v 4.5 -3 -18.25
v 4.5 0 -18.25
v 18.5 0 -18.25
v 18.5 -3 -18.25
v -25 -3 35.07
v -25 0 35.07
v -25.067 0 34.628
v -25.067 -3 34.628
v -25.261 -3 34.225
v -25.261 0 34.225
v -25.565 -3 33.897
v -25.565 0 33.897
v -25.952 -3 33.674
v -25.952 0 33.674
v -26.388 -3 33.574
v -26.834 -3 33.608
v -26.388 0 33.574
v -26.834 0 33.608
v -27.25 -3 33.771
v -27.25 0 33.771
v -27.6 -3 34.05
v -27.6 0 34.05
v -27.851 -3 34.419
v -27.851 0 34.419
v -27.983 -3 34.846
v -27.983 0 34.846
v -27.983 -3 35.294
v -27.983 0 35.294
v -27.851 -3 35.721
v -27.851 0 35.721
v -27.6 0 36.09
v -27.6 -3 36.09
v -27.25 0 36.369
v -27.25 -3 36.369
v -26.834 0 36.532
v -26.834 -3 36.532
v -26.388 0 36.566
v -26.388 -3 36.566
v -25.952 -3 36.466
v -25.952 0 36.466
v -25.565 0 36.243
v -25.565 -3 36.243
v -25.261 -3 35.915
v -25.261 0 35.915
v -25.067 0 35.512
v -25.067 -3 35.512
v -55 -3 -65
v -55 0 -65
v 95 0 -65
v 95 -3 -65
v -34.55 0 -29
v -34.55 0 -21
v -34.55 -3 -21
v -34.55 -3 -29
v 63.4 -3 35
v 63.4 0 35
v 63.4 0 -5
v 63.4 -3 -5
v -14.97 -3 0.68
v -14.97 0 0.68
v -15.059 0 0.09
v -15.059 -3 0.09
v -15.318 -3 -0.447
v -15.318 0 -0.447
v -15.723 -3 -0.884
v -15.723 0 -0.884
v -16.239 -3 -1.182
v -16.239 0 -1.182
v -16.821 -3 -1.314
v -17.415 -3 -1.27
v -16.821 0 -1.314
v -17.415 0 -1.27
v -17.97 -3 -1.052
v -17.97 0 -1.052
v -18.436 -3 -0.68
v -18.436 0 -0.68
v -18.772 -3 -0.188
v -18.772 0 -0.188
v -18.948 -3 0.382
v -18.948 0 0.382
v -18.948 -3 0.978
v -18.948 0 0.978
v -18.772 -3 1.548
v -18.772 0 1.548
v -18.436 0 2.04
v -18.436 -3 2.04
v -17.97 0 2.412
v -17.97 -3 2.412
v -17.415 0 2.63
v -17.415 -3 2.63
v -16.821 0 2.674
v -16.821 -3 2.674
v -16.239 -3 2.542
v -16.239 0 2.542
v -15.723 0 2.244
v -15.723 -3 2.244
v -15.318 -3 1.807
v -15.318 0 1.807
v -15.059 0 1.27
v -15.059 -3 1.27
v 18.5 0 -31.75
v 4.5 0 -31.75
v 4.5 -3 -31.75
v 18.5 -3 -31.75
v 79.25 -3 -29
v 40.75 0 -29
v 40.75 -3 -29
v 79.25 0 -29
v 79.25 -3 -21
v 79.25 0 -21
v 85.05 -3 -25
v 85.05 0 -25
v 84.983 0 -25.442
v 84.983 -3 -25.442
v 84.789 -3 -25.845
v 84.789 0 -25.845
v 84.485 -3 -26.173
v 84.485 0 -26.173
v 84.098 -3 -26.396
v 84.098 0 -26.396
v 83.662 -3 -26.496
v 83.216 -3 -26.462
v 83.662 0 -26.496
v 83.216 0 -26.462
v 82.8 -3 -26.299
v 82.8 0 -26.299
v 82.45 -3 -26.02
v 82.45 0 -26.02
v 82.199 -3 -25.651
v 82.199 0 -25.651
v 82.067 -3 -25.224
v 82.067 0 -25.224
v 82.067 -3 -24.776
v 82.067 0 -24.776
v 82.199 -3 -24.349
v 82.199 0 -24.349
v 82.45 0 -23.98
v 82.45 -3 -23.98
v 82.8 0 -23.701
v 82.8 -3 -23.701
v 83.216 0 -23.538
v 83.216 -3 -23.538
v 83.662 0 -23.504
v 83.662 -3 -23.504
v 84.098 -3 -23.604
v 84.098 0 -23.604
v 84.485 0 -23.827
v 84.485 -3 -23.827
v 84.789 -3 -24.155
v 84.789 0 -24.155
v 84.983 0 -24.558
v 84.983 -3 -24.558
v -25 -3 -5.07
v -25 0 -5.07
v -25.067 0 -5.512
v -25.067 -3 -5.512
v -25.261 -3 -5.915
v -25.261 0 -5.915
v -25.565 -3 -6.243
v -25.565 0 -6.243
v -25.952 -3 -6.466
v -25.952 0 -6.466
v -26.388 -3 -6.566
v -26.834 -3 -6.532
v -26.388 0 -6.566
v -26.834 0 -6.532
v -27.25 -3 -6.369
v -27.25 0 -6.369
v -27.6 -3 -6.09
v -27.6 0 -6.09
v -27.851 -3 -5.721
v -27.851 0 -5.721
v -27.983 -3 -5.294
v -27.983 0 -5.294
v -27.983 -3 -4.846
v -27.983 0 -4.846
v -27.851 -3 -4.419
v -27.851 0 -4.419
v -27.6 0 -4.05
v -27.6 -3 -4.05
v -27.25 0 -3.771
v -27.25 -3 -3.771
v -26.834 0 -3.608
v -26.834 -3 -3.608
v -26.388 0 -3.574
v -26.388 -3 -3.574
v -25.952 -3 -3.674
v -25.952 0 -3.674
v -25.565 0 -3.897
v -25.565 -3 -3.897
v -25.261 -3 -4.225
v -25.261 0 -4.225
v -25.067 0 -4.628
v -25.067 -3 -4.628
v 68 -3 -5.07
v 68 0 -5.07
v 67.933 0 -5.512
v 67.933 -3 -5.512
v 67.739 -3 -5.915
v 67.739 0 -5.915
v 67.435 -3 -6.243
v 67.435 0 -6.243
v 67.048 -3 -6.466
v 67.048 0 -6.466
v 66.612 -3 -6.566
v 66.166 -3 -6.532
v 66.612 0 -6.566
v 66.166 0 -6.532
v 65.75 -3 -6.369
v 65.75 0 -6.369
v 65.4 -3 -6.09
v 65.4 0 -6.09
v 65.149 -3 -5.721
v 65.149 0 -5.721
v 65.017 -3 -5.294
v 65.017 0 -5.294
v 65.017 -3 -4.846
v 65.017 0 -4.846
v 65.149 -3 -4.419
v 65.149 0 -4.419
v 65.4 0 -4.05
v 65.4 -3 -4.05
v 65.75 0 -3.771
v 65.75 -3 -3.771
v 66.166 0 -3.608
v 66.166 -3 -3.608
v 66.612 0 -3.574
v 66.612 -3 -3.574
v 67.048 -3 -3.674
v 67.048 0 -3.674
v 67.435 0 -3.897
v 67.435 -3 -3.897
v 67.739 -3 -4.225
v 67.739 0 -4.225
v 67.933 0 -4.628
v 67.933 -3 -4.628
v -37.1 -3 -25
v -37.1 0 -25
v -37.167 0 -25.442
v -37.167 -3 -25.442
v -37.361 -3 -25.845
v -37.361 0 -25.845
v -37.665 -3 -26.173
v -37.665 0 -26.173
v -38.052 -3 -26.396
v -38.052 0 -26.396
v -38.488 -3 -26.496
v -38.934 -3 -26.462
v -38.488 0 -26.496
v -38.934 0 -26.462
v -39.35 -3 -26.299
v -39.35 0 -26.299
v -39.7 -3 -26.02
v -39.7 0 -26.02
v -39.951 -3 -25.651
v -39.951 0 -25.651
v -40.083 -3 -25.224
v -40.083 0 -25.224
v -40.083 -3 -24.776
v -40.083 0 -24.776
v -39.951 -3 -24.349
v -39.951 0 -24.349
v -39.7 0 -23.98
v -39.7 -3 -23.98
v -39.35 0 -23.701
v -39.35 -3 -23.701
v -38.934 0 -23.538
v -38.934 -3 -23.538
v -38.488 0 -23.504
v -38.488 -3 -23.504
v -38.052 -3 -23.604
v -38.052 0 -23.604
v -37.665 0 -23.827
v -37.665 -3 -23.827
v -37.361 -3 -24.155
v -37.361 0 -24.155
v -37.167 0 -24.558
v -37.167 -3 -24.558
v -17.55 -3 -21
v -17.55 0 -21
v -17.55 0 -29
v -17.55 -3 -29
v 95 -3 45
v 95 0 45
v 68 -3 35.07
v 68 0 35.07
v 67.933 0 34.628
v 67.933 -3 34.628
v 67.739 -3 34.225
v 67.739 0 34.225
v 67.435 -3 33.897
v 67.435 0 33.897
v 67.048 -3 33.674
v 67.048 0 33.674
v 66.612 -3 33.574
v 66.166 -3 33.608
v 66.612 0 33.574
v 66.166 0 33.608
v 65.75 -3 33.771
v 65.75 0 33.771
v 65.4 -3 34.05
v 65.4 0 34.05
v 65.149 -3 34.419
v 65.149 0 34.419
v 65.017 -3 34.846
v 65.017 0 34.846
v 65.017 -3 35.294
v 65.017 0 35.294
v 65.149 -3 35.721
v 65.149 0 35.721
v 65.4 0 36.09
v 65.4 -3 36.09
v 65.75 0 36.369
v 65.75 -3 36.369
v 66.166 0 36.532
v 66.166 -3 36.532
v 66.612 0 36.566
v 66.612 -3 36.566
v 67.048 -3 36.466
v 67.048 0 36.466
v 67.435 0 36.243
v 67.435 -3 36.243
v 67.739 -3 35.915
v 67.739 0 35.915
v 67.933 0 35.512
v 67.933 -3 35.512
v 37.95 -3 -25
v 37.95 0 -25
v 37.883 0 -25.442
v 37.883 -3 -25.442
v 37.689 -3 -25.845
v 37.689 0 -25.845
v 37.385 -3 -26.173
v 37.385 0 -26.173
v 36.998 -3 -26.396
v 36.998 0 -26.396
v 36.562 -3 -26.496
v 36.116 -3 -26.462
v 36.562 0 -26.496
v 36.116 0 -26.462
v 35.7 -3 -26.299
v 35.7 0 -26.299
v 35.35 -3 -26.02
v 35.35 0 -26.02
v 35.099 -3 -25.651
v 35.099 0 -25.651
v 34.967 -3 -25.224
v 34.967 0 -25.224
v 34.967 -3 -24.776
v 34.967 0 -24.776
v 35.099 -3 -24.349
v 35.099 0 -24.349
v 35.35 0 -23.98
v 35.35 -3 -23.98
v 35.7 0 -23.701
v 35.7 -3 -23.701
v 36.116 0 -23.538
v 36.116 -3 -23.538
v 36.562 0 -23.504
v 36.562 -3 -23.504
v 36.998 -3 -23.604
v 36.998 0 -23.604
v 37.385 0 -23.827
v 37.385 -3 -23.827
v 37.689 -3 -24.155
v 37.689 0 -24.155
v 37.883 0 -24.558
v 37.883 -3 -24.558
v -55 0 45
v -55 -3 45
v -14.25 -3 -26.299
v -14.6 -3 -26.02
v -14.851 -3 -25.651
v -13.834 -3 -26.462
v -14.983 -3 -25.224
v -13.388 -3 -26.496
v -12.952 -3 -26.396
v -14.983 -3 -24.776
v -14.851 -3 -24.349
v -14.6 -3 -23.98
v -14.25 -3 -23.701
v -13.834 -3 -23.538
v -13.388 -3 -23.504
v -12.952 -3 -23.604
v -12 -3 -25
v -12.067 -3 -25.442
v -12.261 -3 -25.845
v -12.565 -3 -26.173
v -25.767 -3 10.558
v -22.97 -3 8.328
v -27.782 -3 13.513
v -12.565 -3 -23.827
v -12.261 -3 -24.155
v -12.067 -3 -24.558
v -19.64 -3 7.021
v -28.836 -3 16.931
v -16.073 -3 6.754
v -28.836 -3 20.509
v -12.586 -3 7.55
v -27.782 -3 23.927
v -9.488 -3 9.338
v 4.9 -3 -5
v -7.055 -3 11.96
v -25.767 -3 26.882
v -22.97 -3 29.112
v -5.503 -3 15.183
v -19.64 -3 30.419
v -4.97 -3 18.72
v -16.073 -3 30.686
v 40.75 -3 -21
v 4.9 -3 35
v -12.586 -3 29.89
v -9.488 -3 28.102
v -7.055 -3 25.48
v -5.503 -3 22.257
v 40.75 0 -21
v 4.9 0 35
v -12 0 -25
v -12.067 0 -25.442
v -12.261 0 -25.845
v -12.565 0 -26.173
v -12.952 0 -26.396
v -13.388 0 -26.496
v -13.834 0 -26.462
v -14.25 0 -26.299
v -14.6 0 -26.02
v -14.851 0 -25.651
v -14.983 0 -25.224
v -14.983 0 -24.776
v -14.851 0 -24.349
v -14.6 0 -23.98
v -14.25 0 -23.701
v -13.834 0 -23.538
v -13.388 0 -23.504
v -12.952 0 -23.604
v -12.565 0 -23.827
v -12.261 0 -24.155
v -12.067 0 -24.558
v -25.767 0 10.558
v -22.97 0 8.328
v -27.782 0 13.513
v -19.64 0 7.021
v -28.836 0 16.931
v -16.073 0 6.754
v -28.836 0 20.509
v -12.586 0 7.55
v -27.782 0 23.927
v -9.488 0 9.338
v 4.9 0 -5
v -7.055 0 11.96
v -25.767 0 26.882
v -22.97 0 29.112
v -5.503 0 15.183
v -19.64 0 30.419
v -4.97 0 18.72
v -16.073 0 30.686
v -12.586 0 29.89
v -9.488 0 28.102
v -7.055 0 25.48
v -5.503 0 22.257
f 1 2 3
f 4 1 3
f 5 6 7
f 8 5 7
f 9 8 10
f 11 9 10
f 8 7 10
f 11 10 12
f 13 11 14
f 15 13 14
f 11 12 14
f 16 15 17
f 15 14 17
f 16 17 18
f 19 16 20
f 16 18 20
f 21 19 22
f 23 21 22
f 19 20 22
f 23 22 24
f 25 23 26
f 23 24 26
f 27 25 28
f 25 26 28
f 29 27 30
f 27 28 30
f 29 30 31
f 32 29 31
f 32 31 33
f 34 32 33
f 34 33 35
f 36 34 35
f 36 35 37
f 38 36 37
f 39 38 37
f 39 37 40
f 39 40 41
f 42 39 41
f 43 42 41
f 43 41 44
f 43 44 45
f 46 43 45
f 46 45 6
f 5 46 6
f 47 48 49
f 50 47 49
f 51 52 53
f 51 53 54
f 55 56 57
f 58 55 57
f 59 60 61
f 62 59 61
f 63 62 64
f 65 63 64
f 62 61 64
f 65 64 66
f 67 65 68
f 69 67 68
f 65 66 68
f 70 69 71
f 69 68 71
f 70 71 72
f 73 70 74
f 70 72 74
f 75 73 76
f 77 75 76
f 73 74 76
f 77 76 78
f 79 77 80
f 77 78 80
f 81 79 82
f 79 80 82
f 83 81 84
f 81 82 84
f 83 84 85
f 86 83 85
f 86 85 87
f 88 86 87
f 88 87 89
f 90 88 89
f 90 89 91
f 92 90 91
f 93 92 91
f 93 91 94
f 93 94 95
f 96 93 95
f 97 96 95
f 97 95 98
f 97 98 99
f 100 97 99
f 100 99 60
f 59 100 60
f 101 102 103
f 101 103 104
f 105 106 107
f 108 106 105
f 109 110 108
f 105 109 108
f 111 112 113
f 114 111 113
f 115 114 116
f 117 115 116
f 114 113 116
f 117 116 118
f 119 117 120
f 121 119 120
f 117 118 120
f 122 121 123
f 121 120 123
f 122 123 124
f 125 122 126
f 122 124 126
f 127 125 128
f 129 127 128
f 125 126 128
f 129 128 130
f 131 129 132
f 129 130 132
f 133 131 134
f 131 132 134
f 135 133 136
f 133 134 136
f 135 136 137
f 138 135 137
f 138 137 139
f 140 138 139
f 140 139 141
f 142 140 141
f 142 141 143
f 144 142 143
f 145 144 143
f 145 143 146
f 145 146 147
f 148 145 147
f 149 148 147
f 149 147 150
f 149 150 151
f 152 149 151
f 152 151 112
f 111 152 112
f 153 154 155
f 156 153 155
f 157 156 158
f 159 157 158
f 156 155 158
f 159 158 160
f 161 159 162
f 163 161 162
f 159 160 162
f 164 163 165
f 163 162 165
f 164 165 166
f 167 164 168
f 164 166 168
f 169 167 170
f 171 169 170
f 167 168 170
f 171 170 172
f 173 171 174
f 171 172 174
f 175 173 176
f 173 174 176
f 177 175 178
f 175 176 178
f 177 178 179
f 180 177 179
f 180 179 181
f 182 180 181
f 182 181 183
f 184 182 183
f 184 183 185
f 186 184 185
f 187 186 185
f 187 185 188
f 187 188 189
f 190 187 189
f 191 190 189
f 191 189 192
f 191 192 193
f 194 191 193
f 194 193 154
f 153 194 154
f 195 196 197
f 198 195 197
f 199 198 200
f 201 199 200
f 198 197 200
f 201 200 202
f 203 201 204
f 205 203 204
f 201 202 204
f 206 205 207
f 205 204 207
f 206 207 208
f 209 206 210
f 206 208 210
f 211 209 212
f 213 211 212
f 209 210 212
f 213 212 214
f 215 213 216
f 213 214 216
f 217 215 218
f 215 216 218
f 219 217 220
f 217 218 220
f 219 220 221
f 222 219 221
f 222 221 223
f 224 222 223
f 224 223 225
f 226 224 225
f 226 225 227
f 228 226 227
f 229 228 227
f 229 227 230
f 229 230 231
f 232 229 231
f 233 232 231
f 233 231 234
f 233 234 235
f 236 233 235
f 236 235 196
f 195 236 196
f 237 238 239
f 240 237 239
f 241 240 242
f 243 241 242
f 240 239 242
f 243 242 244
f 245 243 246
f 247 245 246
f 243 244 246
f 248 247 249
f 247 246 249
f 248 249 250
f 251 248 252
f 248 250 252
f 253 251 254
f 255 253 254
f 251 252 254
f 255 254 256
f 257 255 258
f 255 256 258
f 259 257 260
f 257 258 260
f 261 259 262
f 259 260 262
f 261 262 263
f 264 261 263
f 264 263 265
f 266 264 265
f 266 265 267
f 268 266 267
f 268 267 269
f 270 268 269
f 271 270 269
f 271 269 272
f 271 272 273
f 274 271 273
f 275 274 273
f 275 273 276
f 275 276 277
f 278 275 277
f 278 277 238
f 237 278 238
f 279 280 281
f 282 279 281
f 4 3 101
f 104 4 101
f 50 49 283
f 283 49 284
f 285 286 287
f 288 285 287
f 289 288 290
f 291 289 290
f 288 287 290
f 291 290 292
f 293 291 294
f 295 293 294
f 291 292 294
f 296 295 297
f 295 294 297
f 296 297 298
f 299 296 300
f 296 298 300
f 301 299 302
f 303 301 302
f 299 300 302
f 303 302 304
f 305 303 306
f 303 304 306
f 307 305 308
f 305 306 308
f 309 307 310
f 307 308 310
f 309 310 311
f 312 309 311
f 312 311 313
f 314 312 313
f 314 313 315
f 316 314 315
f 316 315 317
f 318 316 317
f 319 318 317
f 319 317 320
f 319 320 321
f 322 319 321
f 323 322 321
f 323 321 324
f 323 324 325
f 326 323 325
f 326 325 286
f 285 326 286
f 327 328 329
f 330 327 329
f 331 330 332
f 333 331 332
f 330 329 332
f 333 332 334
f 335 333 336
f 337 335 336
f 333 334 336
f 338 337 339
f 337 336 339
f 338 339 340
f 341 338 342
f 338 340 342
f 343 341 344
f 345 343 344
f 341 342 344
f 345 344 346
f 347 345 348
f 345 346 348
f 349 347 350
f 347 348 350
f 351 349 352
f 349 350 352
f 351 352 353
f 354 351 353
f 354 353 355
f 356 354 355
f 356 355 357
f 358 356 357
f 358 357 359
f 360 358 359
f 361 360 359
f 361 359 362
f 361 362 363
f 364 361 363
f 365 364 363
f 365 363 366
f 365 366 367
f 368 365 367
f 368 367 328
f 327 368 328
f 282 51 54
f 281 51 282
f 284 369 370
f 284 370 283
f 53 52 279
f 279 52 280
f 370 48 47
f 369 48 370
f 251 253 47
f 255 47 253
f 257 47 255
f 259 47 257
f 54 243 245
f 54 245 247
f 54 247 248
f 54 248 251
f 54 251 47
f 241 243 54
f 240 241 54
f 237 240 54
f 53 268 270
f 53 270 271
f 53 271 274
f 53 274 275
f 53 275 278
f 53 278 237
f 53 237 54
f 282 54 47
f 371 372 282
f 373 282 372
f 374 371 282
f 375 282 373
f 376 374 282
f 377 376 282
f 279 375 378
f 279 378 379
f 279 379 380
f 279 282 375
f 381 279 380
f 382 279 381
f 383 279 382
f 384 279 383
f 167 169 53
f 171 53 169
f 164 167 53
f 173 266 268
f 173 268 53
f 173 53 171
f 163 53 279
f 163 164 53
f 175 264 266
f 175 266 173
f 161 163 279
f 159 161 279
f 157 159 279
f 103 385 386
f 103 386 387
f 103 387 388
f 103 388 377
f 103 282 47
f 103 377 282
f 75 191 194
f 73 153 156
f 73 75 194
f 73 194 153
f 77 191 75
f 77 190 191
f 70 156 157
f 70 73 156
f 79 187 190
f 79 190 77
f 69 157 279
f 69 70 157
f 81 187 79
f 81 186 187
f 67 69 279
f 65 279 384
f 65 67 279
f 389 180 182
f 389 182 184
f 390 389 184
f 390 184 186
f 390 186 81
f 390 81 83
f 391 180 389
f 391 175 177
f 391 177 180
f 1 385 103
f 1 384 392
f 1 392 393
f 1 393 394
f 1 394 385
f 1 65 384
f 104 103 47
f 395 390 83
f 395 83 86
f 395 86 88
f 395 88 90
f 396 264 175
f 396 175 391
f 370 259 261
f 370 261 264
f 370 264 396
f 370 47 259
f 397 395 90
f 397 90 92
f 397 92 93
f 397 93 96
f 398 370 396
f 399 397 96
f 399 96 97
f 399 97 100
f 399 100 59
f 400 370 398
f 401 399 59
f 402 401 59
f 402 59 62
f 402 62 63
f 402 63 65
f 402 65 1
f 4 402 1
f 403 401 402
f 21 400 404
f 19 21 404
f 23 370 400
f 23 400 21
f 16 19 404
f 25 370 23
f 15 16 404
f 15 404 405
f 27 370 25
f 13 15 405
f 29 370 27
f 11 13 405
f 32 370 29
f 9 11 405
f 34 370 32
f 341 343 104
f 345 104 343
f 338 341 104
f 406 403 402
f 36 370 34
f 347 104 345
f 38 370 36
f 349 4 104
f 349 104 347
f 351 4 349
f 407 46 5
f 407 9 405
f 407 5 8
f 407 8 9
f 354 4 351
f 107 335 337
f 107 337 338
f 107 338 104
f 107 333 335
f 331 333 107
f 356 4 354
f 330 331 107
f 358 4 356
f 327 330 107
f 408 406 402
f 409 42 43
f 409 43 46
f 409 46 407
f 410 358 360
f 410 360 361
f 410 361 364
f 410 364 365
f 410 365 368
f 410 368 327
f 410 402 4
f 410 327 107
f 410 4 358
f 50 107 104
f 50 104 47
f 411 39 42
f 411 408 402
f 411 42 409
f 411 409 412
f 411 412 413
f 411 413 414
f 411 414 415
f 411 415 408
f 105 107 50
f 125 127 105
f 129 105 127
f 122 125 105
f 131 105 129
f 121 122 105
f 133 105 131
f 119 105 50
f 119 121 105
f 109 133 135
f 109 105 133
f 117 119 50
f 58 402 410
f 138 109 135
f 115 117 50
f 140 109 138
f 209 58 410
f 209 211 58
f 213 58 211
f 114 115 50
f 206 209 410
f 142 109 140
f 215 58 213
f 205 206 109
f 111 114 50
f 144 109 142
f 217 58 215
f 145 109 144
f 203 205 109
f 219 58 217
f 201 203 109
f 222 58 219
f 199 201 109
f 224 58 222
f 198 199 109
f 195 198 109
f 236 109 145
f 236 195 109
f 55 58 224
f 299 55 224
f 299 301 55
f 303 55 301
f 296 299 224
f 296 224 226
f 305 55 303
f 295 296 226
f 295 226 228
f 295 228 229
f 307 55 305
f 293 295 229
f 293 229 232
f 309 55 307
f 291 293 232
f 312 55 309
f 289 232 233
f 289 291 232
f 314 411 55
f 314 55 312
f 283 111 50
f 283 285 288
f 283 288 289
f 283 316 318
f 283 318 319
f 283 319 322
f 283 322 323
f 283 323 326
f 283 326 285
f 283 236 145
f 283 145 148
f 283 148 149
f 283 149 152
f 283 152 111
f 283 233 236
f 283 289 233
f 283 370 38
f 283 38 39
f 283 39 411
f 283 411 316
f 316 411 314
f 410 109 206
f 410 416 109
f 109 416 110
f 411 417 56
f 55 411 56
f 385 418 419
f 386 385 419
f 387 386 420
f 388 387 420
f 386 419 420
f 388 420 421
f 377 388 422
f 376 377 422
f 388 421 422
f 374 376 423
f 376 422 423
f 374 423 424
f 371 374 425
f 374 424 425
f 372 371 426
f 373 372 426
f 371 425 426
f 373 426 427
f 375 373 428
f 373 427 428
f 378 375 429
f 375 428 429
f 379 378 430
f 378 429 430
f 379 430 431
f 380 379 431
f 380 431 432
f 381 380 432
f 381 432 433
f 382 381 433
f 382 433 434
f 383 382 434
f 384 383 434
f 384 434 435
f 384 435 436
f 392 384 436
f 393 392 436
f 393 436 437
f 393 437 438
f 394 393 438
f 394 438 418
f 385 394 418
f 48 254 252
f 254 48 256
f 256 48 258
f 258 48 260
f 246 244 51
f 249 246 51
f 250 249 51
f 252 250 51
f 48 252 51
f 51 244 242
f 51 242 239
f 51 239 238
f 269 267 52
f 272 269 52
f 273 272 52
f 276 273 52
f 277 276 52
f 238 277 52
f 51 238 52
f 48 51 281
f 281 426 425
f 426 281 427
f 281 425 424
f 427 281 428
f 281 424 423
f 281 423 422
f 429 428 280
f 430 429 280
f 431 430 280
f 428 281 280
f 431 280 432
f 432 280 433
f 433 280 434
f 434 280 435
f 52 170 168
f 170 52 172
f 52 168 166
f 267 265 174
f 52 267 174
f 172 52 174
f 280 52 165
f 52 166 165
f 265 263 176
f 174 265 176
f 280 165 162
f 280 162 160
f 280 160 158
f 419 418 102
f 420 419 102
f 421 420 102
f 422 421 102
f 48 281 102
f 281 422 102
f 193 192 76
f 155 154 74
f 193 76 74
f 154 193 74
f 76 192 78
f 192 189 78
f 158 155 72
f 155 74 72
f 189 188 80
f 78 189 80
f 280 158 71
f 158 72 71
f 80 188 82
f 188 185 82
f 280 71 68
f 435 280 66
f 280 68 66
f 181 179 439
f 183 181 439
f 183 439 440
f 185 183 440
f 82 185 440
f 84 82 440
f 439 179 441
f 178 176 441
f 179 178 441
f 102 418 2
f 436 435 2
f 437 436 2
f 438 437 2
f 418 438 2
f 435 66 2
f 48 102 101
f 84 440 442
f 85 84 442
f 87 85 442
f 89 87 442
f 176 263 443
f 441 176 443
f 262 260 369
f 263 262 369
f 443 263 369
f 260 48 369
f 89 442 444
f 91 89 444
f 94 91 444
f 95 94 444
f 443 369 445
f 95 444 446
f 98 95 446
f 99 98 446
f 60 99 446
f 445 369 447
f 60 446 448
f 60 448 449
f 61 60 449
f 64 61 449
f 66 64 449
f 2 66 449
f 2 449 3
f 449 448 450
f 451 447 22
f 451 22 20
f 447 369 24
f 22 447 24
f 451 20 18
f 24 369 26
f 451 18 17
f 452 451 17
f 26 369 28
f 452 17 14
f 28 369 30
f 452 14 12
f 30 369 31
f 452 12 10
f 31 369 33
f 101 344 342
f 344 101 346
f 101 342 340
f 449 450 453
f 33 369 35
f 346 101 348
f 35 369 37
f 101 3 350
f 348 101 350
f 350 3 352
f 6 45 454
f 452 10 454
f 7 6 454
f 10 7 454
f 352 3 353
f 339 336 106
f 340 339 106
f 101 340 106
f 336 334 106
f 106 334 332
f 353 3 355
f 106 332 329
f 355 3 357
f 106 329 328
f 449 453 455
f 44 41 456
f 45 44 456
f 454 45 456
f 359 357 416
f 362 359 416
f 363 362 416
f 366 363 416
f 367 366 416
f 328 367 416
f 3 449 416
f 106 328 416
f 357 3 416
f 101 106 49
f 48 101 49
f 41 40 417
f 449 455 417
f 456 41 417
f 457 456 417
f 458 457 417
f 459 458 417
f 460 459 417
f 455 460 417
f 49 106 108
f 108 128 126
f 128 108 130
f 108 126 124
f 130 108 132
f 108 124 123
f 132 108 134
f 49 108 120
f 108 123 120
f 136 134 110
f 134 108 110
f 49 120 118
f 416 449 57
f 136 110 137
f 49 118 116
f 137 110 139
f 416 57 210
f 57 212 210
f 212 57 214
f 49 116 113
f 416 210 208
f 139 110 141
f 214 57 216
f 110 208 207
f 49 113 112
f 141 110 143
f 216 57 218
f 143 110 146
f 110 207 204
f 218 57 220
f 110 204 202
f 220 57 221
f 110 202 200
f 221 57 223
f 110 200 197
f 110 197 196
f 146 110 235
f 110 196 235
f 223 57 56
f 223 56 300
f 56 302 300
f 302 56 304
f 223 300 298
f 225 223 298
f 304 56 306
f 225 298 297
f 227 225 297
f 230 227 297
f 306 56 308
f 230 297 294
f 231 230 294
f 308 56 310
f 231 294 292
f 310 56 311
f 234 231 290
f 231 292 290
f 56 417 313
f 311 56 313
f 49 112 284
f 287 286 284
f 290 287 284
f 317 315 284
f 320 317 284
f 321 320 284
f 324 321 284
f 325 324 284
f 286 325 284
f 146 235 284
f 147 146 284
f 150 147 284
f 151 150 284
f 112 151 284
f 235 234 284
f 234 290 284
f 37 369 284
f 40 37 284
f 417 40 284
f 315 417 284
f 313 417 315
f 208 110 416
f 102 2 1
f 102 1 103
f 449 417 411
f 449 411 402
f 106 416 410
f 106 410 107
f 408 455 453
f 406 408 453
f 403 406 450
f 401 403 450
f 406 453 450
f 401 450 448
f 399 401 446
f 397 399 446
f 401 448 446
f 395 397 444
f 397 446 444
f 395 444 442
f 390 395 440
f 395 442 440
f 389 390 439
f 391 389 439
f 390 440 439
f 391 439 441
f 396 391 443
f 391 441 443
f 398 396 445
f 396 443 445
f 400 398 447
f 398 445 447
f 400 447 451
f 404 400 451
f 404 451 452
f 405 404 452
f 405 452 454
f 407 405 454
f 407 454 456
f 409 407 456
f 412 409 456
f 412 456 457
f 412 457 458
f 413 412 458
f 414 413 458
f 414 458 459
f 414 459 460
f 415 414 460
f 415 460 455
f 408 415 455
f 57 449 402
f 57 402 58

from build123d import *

# Parameters (mm, degrees)
SKETCH_W        = 150
SKETCH_H        = 110
PAD_DEPTH       = 3
SKETCH001_R     = 1.5
SKETCH001_R_2   = 12
SKETCH001_R_3   = 2
SKETCH001_W     = 58.5
SKETCH001_H     = 40
POCKET_DEPTH    = 3.001
SKETCH002_R     = 1.5
SKETCH002_W     = 38.5
SKETCH002_H     = 8
SKETCH002_W_2   = 14
SKETCH002_H_2   = 13.5
SKETCH002_W_3   = 17
POCKET001_DEPTH = 3.001


with BuildPart() as part:
    # Sketch → Pad (new body)
    with BuildSketch(Plane.XZ):
        with Locations((20, -10)):
            Rectangle(SKETCH_W, SKETCH_H)
    extrude(amount=PAD_DEPTH)

    # Sketch001 (on Face5 of Pad) → Pocket (cut, through all)
    with BuildSketch(Plane(origin=(0, 0, 0), x_dir=(1, 0, 0), z_dir=(0, 1, 0))):
        with Locations((-26.5, 5.07)):
            Circle(SKETCH001_R)
        with Locations((-26.5, -35.07)):
            Circle(SKETCH001_R)
        with Locations((66.5, -35.07)):
            Circle(SKETCH001_R)
        with Locations((66.5, 5.07)):
            Circle(SKETCH001_R)
        with Locations((-16.97, -18.72)):
            Circle(SKETCH001_R_2)
        with Locations((-16.97, -0.68)):
            Circle(SKETCH001_R_3)
        with Locations((34.15, -15)):
            Rectangle(SKETCH001_W, SKETCH001_H)
    extrude(amount=-POCKET_DEPTH, mode=Mode.SUBTRACT)

    # Sketch002 (on Face4 of Pocket) → Pocket001 (cut, through all)
    with BuildSketch(Plane(origin=(0, 0, 0), x_dir=(1, 0, 0), z_dir=(0, 1, 0))):
        with Locations((36.45, 25)):
            Circle(SKETCH002_R)
        with Locations((83.55, 25)):
            Circle(SKETCH002_R)
        with Locations((-38.6, 25)):
            Circle(SKETCH002_R)
        with Locations((-13.5, 25)):
            Circle(SKETCH002_R)
        with Locations((60, 25)):
            Rectangle(SKETCH002_W, SKETCH002_H)
        with Locations((11.5, 25)):
            Rectangle(SKETCH002_W_2, SKETCH002_H_2)
        with Locations((-26.05, 25)):
            Rectangle(SKETCH002_W_3, SKETCH002_H)
    extrude(amount=-POCKET001_DEPTH, mode=Mode.SUBTRACT)


solid = part.part
